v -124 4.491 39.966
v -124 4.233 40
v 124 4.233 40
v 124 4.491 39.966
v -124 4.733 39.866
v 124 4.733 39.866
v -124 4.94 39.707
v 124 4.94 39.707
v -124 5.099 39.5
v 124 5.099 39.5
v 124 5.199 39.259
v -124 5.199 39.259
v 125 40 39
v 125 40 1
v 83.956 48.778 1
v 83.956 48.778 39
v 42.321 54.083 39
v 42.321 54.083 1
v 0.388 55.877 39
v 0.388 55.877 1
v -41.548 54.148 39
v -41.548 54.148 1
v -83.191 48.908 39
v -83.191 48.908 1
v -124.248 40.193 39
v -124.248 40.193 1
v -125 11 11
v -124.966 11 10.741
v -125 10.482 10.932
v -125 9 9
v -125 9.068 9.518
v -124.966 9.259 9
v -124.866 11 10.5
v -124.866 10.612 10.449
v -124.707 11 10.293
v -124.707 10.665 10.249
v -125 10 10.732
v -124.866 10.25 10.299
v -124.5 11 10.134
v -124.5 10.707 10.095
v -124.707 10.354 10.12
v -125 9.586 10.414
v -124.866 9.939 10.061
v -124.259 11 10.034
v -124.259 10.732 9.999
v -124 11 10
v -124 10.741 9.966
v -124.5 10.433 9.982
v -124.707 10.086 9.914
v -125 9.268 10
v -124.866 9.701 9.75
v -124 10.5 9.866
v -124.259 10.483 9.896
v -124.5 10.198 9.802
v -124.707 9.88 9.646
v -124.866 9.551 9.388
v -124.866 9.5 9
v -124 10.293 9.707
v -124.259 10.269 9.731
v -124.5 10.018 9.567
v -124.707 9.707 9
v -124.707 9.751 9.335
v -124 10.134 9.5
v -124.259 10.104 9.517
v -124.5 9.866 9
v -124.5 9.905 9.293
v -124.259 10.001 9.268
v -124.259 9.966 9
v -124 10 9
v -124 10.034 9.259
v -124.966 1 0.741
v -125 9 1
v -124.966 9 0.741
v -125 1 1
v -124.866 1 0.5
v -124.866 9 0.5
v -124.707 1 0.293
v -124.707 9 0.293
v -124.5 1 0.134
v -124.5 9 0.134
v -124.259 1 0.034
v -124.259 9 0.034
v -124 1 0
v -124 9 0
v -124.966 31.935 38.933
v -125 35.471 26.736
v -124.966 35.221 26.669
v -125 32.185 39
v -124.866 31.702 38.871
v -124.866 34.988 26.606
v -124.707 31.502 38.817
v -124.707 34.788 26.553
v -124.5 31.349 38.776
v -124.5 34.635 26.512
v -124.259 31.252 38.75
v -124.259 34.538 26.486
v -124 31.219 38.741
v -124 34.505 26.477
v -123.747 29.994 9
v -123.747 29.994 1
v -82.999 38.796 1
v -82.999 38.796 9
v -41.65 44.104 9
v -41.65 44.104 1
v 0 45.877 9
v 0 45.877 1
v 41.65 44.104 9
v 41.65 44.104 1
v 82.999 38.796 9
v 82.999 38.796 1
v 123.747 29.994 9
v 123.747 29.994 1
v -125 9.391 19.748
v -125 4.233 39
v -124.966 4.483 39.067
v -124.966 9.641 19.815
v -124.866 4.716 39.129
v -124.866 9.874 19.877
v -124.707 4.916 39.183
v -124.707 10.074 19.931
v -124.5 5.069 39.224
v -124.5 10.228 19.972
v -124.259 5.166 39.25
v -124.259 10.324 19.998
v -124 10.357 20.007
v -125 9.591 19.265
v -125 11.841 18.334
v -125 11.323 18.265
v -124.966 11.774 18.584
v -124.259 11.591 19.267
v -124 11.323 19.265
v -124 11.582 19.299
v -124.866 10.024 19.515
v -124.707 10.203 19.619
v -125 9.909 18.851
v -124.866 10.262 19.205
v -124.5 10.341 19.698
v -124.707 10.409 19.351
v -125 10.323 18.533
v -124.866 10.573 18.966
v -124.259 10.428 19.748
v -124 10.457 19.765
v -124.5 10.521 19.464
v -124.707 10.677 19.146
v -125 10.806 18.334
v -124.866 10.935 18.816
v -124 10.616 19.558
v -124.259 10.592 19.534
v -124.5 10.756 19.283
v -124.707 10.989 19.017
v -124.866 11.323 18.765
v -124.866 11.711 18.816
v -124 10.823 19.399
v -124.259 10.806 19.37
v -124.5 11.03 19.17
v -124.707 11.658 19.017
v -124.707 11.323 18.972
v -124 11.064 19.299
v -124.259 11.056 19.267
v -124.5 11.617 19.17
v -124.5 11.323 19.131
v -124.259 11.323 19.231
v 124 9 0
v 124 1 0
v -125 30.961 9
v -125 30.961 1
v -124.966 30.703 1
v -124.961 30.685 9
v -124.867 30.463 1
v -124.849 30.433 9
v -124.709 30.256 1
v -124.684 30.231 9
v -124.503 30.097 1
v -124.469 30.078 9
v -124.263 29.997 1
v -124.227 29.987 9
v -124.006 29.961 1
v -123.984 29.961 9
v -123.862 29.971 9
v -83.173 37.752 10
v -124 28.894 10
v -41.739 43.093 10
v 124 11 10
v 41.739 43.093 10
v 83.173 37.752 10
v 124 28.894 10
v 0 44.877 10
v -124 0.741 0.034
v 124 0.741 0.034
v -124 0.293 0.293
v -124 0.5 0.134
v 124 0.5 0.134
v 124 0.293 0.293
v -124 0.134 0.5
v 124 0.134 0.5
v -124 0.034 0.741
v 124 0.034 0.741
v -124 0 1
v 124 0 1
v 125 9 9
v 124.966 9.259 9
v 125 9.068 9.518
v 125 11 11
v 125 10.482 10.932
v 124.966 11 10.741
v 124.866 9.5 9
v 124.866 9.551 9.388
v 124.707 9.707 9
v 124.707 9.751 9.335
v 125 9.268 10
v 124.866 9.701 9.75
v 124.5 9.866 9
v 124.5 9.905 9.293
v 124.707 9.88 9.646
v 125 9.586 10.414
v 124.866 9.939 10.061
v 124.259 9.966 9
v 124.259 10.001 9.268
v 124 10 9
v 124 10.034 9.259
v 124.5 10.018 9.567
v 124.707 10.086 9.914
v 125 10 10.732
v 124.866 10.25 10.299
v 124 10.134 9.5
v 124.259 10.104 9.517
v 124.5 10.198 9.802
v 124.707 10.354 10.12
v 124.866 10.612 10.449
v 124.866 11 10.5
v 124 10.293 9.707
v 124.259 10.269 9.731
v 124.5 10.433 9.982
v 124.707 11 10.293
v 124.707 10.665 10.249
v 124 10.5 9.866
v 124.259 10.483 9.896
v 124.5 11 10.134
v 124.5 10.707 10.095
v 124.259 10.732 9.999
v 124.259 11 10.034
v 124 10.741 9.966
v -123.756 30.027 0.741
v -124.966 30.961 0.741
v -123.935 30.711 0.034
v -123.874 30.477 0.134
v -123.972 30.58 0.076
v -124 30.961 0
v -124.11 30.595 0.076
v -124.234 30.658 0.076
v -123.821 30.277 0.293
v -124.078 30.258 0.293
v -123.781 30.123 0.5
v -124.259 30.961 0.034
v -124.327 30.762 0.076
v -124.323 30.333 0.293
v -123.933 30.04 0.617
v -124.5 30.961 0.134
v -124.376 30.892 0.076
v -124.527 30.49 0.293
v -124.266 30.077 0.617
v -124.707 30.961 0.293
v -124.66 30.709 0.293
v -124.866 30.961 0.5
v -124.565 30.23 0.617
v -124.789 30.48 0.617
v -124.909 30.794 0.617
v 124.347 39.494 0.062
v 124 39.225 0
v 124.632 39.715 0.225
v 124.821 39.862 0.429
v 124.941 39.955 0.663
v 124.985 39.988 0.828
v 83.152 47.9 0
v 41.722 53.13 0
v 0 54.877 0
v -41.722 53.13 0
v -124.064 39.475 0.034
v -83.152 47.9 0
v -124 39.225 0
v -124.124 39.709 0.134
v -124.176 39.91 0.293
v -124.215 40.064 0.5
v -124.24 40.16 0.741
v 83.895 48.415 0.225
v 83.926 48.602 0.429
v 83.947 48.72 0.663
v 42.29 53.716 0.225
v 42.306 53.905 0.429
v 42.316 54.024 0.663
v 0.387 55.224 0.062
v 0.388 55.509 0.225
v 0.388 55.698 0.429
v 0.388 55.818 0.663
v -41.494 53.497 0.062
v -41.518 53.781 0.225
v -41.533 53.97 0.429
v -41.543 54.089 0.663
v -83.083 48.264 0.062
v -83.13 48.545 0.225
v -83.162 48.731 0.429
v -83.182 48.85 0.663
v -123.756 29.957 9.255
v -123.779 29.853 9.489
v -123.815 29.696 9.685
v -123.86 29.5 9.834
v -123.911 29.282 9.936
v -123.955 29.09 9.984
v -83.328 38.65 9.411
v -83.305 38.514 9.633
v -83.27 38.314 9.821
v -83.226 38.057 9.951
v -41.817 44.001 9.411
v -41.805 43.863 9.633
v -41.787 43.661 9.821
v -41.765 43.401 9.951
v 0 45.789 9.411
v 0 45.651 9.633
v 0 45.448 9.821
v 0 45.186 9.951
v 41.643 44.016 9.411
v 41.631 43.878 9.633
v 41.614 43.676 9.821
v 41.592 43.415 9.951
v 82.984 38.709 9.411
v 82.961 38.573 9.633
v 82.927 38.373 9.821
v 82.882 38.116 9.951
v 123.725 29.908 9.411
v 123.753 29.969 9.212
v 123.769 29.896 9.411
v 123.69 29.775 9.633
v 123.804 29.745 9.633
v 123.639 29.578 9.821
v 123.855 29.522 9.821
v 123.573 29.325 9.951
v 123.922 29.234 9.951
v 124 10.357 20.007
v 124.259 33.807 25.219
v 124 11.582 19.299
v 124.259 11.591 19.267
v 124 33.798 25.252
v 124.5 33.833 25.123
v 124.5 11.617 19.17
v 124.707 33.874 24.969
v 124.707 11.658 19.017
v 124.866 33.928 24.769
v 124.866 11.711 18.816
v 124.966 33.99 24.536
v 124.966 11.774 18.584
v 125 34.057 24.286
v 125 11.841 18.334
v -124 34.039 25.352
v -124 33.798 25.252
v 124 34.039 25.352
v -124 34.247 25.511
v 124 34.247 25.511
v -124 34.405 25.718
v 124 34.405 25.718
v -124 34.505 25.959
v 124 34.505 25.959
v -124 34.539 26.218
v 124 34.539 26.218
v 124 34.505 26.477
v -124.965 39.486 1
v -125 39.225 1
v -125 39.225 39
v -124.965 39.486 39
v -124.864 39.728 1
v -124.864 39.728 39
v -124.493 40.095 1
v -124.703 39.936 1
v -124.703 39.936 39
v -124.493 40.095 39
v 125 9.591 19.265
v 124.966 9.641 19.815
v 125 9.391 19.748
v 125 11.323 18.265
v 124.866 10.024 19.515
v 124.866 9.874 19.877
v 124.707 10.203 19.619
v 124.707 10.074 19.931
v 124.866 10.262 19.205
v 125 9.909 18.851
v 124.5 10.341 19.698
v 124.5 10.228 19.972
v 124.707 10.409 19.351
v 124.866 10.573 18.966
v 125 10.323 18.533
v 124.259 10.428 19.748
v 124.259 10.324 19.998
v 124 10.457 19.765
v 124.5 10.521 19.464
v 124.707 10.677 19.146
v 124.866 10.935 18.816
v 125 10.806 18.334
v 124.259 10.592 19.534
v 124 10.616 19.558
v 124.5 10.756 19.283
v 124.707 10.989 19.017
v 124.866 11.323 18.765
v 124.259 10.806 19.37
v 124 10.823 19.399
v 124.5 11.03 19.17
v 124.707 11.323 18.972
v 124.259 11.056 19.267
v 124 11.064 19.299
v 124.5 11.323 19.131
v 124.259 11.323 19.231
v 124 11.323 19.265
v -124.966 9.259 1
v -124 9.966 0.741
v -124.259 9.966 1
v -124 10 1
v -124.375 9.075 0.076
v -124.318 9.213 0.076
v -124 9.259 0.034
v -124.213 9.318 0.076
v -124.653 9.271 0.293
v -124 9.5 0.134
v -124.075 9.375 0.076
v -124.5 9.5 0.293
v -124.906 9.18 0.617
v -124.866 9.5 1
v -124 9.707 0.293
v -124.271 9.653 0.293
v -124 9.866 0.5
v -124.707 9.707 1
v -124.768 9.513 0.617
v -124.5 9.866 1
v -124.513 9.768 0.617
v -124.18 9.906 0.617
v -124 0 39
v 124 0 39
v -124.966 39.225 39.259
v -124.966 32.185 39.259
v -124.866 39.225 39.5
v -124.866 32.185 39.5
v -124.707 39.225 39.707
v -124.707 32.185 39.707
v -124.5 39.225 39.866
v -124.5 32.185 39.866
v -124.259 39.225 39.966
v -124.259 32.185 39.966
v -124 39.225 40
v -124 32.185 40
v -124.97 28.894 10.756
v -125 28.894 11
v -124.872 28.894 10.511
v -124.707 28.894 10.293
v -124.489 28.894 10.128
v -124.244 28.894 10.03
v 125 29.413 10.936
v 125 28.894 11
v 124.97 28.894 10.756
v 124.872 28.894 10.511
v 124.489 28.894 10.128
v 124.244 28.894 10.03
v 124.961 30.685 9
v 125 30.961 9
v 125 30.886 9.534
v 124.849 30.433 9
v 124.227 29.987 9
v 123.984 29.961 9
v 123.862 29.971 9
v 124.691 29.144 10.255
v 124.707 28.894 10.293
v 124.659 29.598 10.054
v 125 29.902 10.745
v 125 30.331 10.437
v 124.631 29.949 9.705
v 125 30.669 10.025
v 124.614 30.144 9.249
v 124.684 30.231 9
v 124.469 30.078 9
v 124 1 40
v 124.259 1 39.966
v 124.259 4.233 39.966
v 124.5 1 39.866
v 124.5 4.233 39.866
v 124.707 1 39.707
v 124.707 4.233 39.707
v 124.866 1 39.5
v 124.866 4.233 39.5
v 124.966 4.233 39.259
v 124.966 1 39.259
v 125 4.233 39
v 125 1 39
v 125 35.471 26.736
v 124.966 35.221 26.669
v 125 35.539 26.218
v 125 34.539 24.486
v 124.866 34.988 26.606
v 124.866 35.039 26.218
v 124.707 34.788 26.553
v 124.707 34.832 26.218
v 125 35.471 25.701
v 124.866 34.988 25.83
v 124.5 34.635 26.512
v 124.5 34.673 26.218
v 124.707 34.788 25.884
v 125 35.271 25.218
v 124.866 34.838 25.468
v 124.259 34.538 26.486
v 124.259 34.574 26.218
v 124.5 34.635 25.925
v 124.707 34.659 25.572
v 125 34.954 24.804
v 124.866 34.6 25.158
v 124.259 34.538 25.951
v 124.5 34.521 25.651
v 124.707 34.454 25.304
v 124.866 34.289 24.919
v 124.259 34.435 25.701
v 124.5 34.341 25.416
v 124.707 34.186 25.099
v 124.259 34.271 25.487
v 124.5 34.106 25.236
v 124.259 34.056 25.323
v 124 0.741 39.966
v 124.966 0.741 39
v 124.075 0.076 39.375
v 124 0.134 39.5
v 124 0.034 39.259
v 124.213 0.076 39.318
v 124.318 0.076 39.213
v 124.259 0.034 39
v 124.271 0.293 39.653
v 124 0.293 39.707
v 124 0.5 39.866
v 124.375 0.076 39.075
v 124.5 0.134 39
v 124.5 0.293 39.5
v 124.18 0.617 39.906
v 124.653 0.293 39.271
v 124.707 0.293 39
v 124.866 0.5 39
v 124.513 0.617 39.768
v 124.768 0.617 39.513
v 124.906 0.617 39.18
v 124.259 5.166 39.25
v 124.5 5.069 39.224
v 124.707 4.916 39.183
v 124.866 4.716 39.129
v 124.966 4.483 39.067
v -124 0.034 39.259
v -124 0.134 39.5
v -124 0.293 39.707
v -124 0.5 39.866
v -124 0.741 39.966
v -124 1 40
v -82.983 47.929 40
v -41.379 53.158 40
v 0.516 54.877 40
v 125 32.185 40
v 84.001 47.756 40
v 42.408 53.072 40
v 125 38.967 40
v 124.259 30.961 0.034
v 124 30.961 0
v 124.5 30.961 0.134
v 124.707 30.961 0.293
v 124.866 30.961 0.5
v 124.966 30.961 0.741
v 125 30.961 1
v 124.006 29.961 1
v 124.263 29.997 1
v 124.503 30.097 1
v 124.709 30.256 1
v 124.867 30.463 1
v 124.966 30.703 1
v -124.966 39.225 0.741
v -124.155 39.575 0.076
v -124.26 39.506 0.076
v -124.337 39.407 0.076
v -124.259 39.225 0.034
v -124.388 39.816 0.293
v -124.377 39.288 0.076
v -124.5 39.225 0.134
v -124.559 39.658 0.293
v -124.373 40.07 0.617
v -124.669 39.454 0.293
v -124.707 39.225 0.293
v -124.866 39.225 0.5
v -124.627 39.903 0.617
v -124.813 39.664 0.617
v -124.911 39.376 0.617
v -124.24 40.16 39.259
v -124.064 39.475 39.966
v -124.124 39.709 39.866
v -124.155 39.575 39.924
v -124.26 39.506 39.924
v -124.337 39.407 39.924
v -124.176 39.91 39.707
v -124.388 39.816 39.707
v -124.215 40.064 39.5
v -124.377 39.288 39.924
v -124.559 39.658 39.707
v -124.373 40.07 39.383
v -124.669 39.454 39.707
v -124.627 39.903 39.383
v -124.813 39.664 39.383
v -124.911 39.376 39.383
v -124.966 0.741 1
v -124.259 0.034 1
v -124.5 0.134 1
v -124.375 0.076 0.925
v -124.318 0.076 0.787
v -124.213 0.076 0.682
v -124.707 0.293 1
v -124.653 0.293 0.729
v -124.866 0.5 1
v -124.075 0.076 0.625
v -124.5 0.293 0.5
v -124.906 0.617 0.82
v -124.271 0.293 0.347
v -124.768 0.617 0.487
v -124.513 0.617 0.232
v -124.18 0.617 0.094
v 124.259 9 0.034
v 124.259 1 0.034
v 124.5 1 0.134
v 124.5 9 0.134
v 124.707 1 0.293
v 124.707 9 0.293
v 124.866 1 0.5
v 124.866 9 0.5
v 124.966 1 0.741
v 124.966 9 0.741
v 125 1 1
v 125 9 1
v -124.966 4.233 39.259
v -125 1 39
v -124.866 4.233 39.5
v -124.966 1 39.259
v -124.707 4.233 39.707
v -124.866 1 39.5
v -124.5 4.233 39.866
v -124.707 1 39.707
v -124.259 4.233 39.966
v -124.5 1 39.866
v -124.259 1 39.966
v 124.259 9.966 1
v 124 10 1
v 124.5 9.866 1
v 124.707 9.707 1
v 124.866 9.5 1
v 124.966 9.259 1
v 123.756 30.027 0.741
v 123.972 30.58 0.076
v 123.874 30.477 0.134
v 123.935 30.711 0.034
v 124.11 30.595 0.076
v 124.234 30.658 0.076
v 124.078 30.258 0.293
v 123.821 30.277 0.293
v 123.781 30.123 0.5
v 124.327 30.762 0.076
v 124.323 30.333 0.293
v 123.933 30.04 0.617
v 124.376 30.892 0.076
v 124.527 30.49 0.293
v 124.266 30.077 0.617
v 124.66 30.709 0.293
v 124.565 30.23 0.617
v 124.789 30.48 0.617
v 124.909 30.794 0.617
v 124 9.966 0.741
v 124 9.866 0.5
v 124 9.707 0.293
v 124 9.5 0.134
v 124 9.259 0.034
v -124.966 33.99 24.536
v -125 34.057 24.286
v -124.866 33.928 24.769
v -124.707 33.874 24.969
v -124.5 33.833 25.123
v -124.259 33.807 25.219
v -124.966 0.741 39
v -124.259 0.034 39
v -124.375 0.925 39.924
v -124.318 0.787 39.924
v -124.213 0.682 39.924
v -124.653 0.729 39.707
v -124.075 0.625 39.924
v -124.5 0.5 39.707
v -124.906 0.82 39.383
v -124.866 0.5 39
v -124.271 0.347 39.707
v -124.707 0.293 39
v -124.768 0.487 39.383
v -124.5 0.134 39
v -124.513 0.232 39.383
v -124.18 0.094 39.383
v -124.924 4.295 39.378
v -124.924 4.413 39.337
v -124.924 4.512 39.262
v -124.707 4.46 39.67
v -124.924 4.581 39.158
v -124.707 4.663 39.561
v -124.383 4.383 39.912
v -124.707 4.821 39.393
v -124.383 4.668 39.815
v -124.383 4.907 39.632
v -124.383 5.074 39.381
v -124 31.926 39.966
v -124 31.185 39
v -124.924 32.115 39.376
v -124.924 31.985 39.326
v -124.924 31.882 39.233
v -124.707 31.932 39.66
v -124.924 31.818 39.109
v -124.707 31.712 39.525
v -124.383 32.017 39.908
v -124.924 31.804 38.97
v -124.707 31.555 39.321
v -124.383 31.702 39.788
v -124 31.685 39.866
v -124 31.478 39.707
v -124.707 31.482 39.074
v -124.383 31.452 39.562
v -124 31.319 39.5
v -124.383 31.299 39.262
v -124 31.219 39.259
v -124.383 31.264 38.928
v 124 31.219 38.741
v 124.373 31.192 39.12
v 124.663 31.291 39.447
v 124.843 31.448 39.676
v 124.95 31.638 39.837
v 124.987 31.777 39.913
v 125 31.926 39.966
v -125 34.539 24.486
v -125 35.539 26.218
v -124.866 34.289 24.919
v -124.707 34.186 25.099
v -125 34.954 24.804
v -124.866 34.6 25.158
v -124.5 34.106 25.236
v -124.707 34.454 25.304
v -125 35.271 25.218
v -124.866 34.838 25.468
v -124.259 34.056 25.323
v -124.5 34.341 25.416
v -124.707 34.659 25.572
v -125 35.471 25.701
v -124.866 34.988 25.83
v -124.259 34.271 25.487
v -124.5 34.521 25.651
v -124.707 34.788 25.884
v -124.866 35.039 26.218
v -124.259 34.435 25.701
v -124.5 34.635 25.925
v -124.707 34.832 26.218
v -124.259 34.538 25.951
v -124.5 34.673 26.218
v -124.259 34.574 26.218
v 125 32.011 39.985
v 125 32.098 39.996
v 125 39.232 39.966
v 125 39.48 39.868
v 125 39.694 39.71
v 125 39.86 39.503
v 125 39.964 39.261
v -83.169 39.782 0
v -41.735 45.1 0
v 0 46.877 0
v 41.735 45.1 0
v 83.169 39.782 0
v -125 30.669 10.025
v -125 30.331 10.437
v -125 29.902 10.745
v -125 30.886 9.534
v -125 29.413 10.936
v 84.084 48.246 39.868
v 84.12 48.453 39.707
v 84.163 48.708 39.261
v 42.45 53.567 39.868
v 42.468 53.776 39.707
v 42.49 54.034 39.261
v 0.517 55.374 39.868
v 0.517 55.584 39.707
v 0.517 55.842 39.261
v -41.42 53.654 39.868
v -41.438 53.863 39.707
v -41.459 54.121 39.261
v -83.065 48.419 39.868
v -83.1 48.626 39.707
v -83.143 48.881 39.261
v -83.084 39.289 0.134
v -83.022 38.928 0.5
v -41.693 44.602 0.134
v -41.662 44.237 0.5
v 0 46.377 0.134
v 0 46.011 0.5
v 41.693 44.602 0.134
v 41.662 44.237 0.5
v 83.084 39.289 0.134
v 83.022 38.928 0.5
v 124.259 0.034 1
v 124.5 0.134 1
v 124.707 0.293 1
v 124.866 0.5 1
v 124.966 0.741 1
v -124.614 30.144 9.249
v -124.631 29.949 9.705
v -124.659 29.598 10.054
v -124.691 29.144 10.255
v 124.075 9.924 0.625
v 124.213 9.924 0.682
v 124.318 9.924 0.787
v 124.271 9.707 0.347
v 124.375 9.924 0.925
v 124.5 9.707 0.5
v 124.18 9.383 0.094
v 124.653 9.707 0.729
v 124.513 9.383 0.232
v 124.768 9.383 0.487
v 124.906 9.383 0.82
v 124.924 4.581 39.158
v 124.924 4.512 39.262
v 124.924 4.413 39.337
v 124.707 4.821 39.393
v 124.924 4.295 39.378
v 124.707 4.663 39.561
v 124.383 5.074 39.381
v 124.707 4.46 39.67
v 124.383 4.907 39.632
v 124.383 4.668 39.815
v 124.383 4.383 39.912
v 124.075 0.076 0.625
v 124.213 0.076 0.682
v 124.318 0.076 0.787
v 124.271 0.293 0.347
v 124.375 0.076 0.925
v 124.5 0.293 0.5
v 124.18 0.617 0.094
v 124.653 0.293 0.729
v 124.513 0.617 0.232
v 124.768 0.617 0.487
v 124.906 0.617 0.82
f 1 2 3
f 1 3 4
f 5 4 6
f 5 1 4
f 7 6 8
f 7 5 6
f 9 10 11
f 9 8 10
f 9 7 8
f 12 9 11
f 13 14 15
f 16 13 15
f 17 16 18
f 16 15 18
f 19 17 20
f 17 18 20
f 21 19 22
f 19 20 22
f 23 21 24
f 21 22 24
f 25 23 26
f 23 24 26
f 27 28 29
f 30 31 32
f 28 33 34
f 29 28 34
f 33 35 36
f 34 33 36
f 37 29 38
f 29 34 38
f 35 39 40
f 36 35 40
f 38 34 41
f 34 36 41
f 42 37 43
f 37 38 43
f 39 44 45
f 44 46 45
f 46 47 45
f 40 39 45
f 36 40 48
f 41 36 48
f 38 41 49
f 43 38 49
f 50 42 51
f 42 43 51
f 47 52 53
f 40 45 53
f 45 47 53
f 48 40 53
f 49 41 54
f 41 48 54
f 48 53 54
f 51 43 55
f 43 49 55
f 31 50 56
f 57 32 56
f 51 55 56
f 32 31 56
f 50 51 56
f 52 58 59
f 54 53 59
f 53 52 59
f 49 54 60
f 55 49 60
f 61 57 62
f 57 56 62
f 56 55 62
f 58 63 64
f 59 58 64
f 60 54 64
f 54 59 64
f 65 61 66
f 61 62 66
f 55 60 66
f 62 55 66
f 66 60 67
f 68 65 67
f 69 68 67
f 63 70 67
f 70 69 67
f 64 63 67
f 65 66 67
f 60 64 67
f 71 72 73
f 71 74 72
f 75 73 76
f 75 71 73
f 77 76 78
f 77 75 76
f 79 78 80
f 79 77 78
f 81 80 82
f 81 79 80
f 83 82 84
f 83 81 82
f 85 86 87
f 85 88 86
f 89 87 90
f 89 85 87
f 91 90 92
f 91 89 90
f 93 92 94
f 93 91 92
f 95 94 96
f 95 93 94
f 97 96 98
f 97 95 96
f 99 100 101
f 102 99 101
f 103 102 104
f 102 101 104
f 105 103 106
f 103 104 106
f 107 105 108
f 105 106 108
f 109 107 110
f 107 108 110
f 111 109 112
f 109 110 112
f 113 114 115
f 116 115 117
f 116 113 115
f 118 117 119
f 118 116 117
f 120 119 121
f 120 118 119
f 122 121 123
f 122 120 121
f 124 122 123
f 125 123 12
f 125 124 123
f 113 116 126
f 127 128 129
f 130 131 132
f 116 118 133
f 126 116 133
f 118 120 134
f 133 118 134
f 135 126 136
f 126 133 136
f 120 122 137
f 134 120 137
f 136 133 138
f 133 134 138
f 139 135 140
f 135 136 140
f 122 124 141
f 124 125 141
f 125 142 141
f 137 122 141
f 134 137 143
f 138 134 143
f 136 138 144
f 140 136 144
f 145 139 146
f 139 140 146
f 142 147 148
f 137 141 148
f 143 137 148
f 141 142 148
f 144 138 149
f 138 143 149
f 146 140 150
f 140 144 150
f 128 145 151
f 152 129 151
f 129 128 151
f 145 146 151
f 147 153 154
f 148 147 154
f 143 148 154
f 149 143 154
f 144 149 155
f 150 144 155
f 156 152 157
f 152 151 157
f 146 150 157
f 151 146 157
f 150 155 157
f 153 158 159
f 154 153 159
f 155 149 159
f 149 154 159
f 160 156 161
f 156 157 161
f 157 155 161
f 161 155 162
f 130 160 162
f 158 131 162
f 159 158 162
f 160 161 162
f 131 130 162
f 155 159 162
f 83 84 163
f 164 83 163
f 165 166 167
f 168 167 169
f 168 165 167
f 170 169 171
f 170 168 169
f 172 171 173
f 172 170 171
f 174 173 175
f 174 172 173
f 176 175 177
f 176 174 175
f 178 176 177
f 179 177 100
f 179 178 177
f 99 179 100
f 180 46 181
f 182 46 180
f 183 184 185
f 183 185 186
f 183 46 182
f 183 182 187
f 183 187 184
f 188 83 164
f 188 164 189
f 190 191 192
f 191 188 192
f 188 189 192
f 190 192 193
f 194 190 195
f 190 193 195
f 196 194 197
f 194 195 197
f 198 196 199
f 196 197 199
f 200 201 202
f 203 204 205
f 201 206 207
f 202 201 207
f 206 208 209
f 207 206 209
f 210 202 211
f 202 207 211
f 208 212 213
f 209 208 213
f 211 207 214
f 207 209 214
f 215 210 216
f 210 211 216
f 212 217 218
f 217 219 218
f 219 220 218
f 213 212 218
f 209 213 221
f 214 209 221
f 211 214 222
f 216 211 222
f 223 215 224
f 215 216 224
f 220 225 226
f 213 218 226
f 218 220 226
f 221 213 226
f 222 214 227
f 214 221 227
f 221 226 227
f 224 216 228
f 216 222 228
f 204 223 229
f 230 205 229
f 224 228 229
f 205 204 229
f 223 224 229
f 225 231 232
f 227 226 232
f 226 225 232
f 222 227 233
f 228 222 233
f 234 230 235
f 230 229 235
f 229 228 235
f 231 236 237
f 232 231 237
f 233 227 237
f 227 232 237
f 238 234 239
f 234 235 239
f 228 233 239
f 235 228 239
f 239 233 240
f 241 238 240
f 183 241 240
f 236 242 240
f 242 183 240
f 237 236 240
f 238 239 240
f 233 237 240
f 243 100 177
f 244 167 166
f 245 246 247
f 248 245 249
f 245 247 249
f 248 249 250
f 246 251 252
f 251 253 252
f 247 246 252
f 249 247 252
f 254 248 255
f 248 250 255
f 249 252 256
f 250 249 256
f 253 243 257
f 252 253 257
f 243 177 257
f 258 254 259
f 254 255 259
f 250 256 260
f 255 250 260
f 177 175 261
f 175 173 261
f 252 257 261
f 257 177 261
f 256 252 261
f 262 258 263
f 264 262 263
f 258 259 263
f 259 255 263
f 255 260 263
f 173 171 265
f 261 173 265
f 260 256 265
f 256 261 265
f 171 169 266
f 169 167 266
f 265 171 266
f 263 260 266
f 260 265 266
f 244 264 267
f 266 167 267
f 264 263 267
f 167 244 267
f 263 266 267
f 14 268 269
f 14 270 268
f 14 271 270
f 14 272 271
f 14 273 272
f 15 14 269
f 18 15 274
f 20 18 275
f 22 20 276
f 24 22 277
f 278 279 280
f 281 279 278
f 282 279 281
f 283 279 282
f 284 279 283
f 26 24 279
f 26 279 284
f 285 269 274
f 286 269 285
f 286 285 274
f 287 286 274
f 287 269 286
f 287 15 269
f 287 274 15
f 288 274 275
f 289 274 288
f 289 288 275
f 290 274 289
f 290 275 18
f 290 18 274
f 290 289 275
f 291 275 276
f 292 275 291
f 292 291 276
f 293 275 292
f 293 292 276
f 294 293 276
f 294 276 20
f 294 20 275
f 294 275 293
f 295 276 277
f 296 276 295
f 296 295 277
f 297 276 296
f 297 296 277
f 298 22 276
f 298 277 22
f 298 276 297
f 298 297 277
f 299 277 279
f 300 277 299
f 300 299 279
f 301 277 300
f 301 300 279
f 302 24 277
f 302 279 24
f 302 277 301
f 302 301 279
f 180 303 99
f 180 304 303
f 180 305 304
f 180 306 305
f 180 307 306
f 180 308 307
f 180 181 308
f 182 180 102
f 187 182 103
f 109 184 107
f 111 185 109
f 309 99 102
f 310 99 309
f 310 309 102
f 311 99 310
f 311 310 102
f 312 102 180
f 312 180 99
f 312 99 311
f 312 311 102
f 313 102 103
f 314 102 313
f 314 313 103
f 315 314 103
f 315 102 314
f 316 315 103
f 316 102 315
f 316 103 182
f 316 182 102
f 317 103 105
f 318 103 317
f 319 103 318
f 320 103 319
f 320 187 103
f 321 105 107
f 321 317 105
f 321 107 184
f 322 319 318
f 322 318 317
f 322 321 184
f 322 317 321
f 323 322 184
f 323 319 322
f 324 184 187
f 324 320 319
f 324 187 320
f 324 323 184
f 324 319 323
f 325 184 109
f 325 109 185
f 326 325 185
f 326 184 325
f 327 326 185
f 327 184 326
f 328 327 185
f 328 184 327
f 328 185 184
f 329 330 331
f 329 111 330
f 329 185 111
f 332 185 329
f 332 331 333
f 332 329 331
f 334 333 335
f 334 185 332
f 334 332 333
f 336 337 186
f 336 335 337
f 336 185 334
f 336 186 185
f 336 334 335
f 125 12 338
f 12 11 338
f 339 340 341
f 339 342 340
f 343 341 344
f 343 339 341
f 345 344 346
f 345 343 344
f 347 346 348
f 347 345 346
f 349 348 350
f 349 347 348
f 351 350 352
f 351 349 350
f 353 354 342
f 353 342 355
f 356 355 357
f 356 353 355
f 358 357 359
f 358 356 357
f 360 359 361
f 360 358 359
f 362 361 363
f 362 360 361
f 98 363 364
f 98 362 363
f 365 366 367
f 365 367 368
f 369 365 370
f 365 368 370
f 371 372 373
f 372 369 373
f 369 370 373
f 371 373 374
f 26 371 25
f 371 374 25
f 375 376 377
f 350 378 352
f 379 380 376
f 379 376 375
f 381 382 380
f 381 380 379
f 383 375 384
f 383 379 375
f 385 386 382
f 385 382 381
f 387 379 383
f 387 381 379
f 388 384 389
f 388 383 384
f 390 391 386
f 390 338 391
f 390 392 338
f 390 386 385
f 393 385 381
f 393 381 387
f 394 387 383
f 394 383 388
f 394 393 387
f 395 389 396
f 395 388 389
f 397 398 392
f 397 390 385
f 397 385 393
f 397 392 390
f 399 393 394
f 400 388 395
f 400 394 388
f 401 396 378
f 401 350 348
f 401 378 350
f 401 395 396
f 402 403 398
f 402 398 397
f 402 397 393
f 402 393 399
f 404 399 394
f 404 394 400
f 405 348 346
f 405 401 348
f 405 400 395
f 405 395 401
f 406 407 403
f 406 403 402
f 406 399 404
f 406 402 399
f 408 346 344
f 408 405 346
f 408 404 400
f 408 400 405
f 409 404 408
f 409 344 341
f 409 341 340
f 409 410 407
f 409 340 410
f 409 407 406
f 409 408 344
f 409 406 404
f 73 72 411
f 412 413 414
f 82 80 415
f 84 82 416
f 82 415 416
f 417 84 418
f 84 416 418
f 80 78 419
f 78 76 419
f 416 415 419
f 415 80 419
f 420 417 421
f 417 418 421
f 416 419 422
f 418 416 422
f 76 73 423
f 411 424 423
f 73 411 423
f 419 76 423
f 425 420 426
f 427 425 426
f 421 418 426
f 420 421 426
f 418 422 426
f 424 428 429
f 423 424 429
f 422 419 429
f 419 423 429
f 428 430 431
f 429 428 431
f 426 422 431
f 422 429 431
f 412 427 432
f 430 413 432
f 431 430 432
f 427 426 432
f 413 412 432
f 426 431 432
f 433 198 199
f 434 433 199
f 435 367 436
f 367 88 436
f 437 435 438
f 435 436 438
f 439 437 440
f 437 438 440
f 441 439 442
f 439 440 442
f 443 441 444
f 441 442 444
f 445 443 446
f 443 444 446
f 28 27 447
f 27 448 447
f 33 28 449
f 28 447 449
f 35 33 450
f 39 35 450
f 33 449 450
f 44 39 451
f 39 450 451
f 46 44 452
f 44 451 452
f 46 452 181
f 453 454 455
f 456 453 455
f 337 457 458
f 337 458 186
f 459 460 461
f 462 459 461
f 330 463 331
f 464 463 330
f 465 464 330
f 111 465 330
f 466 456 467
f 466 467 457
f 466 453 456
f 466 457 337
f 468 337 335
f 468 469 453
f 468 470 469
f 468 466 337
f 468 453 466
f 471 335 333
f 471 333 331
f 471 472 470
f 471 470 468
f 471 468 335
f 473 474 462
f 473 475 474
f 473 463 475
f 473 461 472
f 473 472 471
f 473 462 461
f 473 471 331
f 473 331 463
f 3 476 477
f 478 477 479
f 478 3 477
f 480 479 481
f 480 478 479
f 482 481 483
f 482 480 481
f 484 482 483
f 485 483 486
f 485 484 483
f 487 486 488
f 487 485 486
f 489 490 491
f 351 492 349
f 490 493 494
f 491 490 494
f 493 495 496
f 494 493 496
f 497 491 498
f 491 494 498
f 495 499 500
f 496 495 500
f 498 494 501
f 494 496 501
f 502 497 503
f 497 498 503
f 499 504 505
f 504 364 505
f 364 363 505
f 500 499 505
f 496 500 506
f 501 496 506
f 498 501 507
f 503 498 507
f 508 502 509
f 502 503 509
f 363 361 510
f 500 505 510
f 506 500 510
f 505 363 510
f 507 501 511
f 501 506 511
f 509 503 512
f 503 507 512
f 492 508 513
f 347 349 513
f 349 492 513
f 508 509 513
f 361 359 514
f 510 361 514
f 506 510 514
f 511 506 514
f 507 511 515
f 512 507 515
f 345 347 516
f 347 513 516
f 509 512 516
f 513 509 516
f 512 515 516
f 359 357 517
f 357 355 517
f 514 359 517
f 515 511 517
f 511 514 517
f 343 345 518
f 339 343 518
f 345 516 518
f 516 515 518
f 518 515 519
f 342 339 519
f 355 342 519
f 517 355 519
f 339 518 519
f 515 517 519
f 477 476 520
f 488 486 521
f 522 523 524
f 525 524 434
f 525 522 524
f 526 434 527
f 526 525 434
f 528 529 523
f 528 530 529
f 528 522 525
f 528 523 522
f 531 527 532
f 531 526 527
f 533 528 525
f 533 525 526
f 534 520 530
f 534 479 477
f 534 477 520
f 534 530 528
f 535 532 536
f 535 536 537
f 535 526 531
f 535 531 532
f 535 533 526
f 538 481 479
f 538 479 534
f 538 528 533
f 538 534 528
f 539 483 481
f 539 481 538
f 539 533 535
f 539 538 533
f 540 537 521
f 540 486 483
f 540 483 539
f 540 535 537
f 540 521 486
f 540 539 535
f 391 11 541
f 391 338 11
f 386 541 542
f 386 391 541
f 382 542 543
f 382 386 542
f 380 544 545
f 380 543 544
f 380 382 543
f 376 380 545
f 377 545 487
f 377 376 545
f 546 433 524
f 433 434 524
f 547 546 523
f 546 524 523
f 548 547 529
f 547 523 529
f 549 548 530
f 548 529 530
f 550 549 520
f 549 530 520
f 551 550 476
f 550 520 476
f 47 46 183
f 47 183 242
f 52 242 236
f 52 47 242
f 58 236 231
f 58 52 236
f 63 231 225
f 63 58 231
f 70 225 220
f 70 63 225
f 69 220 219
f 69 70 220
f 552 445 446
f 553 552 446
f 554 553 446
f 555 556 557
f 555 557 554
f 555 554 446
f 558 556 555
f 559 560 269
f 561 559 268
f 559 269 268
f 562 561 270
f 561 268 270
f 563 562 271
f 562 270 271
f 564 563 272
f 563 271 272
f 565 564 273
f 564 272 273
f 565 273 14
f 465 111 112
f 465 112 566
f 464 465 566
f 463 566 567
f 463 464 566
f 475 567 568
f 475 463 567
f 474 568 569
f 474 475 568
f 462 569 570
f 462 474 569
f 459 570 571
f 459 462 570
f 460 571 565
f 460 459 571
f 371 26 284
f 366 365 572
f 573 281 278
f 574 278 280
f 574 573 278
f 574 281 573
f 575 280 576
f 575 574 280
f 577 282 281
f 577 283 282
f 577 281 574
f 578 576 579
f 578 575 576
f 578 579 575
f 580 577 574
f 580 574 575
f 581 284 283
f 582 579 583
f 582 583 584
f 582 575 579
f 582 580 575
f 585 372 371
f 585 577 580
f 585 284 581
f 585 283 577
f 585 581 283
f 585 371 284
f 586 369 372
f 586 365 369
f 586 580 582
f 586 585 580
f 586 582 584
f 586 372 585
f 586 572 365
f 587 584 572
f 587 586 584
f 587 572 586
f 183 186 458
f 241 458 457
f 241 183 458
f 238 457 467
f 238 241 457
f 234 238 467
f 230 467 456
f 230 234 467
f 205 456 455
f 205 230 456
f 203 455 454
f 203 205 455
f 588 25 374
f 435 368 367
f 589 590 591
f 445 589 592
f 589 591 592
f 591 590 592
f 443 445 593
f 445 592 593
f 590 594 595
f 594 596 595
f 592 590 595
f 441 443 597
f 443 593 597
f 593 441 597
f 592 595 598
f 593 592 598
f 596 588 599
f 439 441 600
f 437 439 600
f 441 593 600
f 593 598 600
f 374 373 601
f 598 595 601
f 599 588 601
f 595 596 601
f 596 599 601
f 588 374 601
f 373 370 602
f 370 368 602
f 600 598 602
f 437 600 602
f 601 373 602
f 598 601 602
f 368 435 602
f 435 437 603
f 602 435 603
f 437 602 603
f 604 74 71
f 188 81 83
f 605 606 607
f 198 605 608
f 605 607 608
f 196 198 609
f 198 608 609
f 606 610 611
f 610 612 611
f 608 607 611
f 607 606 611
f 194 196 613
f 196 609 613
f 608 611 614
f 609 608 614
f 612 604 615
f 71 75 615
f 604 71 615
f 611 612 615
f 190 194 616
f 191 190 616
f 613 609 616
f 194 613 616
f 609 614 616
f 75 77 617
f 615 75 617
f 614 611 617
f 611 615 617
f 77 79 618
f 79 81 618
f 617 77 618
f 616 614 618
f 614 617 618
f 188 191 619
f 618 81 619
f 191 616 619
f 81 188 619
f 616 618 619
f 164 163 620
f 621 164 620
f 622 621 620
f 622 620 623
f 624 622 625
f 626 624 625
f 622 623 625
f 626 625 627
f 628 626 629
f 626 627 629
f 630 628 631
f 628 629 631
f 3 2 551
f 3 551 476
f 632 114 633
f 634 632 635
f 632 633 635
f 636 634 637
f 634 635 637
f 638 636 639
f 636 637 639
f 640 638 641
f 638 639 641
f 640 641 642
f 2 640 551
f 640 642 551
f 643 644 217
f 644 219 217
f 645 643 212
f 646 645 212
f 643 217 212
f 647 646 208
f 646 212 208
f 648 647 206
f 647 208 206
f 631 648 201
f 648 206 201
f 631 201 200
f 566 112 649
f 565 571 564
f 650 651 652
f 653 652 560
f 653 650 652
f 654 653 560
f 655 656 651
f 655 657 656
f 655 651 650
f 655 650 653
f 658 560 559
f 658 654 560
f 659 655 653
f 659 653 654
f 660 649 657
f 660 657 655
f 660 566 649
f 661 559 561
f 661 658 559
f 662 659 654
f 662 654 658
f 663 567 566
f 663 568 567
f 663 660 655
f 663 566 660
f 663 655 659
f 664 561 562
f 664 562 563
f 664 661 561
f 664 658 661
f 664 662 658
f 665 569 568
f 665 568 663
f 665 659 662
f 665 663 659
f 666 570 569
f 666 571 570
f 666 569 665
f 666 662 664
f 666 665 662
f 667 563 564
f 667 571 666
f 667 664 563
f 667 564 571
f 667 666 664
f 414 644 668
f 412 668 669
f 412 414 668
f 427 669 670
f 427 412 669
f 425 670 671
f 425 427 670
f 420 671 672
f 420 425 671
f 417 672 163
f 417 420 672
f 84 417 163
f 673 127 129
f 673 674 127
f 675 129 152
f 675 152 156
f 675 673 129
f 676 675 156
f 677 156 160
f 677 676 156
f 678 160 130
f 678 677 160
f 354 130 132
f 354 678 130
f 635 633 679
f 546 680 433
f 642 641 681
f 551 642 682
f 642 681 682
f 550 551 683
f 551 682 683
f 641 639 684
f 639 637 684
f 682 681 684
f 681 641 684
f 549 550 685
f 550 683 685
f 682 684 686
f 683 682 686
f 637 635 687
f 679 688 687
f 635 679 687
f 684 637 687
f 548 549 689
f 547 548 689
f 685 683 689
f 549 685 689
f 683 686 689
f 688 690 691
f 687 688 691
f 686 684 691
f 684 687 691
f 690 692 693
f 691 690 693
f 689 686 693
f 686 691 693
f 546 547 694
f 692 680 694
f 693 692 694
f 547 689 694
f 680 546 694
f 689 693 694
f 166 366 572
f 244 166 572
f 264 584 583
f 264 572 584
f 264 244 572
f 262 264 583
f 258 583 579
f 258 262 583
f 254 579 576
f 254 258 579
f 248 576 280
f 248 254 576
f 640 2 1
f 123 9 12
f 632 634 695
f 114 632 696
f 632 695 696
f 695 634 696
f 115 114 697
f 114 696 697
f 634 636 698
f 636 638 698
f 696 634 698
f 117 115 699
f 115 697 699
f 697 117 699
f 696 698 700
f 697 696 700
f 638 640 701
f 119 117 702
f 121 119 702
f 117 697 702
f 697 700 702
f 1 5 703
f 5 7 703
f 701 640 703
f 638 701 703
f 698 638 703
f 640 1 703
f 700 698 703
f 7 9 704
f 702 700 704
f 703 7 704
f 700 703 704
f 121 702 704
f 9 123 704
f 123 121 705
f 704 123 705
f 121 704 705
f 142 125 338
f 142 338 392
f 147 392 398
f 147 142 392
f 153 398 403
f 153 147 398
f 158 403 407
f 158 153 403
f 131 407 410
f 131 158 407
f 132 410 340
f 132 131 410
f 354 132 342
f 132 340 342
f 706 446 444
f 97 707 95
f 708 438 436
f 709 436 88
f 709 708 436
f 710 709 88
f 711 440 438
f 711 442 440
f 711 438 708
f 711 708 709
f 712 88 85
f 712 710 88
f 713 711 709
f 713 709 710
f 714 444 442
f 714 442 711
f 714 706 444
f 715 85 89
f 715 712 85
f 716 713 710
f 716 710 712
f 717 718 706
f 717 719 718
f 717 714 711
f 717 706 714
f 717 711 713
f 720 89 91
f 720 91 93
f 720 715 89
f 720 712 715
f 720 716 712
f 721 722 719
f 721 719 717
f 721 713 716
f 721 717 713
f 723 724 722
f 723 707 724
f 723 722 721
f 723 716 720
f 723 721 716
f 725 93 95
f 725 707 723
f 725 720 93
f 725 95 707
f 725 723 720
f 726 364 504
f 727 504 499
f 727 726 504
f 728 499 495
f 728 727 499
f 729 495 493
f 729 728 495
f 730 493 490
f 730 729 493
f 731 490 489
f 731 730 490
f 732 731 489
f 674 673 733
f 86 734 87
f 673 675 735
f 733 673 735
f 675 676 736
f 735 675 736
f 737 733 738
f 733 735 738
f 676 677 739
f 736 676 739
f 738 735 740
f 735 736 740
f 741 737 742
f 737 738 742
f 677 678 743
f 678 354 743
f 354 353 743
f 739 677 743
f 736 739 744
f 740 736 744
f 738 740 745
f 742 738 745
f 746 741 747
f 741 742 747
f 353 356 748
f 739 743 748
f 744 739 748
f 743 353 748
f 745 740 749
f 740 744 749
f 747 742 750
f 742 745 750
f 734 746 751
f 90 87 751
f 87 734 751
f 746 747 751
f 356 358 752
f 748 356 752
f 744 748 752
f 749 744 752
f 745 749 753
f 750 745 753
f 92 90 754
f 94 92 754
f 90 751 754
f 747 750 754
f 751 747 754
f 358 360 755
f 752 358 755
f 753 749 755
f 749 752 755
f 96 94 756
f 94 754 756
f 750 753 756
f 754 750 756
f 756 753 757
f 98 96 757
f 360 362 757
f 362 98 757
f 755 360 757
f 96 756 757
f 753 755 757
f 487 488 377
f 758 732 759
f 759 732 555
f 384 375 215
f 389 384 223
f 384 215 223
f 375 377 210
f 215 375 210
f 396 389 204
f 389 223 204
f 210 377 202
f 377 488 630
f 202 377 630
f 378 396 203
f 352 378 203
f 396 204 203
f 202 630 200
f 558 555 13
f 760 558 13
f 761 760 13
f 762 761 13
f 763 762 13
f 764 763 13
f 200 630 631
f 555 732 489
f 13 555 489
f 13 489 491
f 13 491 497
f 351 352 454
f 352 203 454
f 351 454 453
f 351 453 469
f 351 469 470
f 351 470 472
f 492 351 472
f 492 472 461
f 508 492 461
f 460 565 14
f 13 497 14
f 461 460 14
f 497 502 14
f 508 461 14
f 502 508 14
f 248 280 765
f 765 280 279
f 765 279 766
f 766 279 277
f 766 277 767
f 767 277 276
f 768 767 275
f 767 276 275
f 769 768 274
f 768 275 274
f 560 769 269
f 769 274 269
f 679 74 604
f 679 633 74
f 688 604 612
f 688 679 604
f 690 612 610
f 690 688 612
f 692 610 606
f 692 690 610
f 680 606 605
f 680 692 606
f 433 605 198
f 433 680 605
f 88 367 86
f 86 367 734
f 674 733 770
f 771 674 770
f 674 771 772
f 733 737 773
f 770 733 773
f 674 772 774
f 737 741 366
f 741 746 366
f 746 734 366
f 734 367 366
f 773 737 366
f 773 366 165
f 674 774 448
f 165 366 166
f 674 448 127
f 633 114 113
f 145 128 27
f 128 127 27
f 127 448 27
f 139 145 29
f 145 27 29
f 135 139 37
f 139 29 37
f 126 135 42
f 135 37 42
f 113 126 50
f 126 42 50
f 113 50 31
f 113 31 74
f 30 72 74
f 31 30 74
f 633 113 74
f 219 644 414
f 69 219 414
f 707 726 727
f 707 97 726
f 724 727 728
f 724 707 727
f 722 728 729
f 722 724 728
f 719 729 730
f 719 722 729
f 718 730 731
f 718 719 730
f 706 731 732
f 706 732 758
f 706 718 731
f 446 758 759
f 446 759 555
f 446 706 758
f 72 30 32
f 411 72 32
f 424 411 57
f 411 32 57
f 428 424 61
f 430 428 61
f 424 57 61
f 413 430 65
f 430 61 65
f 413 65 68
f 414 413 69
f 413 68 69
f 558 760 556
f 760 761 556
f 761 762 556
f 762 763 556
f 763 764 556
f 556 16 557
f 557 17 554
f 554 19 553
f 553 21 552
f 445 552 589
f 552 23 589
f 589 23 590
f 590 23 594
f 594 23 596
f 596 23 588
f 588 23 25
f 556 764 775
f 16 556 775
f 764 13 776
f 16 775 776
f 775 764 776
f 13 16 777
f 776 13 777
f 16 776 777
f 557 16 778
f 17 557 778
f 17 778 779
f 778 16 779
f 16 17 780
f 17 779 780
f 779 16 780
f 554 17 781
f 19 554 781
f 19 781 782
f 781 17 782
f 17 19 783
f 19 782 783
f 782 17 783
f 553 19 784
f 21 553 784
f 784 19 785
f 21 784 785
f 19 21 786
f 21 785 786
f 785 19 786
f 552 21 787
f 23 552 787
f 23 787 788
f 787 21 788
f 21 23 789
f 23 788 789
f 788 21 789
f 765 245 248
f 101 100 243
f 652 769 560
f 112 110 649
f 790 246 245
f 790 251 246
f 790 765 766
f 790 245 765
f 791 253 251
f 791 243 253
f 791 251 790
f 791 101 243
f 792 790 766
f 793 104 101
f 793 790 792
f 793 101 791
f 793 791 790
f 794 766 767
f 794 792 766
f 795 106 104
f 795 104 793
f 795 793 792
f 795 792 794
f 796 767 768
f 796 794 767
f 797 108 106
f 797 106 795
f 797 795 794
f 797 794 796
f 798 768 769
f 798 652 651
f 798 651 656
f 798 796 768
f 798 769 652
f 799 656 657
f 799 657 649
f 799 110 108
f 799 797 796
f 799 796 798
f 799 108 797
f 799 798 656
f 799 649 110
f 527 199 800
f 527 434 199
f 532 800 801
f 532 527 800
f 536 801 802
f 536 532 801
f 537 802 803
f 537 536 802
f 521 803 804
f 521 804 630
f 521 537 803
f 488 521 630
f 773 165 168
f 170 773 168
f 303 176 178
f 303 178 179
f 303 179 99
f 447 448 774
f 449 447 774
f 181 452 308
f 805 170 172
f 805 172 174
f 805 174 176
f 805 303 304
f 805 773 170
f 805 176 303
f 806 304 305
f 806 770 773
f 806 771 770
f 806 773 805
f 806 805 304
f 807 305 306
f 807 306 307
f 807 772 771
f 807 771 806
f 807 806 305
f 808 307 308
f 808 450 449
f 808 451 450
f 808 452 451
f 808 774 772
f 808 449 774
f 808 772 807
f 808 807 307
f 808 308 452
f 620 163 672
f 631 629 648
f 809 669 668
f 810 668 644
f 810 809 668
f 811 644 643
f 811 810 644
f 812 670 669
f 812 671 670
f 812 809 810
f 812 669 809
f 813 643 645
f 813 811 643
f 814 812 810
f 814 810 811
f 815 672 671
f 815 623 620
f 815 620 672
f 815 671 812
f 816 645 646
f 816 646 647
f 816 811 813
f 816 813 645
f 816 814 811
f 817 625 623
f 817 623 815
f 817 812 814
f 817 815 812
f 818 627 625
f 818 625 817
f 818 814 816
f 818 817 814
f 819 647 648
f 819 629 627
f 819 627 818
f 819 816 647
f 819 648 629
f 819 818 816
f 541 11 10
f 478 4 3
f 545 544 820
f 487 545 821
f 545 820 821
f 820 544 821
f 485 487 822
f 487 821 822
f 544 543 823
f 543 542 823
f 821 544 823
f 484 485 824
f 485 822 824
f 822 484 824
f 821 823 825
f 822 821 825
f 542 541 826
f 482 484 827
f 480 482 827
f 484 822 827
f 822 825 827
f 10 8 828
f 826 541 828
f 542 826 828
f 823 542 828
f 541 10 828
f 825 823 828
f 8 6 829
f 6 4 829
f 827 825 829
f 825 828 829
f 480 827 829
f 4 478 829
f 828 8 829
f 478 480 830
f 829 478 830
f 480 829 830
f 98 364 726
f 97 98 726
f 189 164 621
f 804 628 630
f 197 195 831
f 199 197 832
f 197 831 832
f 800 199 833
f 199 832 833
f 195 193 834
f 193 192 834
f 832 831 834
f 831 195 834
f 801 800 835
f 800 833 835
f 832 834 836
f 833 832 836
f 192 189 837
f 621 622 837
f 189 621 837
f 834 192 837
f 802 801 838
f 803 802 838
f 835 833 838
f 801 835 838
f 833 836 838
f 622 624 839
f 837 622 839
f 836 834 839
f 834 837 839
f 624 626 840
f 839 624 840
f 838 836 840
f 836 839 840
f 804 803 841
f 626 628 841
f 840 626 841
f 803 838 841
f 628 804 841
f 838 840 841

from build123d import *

# Parameters (mm, degrees)
F1_DEPTH = 40
F3_DEPTH = 250.001
F5_DEPTH = 10
F6_R     = 1


with BuildPart() as f1:
    # F0 (on Top) → F1 (new body)
    with BuildSketch(Plane.XY):
        with BuildLine():
            Line((-125, 40), (-125, 0))
            Line((-125, 0), (125, 0))
            Line((125, 0), (125, 40))
            ThreePointArc((125, 40), (0, 55.8770817241), (-125, 40))
        make_face()
    extrude(amount=F1_DEPTH)

    # F2 (on face) → F3 (cut, through all)
    with BuildSketch(Plane.YZ.offset(125)):
        Polygon((5, 40), (10.6160445296, 19.0406364781), (34.7641901868, 25.5111126057), (30.8819045103, 40), align=None)
    extrude(amount=-F3_DEPTH, mode=Mode.SUBTRACT)

    # F4 (on face) → F5 (cut)
    with BuildSketch(Plane(origin=(0, 0, 0), x_dir=(1, 0, 0), z_dir=(0, 0, -1))):
        with BuildLine():
            ThreePointArc((-125, -29.6650089658), (0, -45.8770817241), (125, -29.6650089658))
            Line((125, -29.6650089658), (125, -10))
            Line((125, -10), (-125, -10))
            Line((-125, -10), (-125, -29.6650089658))
        make_face()
    extrude(amount=-F5_DEPTH, mode=Mode.SUBTRACT)

    # F6
    f6_edges = [f1.edges().sort_by_distance(p)[0] for p in [
        (0, 55.877082, 40),
        (0, 30.881905, 40),
        (-125, 35.440952, 40),
        (-125, 34.832504, 0),
        (-125, 29.665009, 5),
        (-125, 19.832504, 10),
        (-125, 10, 5),
        (-125, 5, 0),
        (-125, 0, 20),
        (-125, 2.5, 40),
        (-125, 7.808022, 29.520318),
        (-125, 22.690117, 22.275875),
        (-125, 32.823047, 32.755556),
        (-125, 40, 20),
        (125, 22.690117, 22.275875),
        (0, 34.76419, 25.511113),
        (0, 10.616045, 19.040636),
        (125, 2.5, 40),
        (0, 0, 40),
        (0, 5, 40),
        (0, 45.877082, 10),
        (125, 19.832504, 10),
        (0, 10, 10),
        (125, 29.665009, 5),
        (0, 45.877082, 0),
        (125, 34.832504, 0),
        (0, 55.877082, 0),
        (125, 5, 0),
        (0, 0, 0),
        (0, 10, 0),
        (125, 0, 20),
        (125, 10, 5),
        (125, 32.823047, 32.755556),
        (125, 7.808022, 29.520318),
    ]]
    fillet(f6_edges, radius=F6_R)


solid = f1.part
